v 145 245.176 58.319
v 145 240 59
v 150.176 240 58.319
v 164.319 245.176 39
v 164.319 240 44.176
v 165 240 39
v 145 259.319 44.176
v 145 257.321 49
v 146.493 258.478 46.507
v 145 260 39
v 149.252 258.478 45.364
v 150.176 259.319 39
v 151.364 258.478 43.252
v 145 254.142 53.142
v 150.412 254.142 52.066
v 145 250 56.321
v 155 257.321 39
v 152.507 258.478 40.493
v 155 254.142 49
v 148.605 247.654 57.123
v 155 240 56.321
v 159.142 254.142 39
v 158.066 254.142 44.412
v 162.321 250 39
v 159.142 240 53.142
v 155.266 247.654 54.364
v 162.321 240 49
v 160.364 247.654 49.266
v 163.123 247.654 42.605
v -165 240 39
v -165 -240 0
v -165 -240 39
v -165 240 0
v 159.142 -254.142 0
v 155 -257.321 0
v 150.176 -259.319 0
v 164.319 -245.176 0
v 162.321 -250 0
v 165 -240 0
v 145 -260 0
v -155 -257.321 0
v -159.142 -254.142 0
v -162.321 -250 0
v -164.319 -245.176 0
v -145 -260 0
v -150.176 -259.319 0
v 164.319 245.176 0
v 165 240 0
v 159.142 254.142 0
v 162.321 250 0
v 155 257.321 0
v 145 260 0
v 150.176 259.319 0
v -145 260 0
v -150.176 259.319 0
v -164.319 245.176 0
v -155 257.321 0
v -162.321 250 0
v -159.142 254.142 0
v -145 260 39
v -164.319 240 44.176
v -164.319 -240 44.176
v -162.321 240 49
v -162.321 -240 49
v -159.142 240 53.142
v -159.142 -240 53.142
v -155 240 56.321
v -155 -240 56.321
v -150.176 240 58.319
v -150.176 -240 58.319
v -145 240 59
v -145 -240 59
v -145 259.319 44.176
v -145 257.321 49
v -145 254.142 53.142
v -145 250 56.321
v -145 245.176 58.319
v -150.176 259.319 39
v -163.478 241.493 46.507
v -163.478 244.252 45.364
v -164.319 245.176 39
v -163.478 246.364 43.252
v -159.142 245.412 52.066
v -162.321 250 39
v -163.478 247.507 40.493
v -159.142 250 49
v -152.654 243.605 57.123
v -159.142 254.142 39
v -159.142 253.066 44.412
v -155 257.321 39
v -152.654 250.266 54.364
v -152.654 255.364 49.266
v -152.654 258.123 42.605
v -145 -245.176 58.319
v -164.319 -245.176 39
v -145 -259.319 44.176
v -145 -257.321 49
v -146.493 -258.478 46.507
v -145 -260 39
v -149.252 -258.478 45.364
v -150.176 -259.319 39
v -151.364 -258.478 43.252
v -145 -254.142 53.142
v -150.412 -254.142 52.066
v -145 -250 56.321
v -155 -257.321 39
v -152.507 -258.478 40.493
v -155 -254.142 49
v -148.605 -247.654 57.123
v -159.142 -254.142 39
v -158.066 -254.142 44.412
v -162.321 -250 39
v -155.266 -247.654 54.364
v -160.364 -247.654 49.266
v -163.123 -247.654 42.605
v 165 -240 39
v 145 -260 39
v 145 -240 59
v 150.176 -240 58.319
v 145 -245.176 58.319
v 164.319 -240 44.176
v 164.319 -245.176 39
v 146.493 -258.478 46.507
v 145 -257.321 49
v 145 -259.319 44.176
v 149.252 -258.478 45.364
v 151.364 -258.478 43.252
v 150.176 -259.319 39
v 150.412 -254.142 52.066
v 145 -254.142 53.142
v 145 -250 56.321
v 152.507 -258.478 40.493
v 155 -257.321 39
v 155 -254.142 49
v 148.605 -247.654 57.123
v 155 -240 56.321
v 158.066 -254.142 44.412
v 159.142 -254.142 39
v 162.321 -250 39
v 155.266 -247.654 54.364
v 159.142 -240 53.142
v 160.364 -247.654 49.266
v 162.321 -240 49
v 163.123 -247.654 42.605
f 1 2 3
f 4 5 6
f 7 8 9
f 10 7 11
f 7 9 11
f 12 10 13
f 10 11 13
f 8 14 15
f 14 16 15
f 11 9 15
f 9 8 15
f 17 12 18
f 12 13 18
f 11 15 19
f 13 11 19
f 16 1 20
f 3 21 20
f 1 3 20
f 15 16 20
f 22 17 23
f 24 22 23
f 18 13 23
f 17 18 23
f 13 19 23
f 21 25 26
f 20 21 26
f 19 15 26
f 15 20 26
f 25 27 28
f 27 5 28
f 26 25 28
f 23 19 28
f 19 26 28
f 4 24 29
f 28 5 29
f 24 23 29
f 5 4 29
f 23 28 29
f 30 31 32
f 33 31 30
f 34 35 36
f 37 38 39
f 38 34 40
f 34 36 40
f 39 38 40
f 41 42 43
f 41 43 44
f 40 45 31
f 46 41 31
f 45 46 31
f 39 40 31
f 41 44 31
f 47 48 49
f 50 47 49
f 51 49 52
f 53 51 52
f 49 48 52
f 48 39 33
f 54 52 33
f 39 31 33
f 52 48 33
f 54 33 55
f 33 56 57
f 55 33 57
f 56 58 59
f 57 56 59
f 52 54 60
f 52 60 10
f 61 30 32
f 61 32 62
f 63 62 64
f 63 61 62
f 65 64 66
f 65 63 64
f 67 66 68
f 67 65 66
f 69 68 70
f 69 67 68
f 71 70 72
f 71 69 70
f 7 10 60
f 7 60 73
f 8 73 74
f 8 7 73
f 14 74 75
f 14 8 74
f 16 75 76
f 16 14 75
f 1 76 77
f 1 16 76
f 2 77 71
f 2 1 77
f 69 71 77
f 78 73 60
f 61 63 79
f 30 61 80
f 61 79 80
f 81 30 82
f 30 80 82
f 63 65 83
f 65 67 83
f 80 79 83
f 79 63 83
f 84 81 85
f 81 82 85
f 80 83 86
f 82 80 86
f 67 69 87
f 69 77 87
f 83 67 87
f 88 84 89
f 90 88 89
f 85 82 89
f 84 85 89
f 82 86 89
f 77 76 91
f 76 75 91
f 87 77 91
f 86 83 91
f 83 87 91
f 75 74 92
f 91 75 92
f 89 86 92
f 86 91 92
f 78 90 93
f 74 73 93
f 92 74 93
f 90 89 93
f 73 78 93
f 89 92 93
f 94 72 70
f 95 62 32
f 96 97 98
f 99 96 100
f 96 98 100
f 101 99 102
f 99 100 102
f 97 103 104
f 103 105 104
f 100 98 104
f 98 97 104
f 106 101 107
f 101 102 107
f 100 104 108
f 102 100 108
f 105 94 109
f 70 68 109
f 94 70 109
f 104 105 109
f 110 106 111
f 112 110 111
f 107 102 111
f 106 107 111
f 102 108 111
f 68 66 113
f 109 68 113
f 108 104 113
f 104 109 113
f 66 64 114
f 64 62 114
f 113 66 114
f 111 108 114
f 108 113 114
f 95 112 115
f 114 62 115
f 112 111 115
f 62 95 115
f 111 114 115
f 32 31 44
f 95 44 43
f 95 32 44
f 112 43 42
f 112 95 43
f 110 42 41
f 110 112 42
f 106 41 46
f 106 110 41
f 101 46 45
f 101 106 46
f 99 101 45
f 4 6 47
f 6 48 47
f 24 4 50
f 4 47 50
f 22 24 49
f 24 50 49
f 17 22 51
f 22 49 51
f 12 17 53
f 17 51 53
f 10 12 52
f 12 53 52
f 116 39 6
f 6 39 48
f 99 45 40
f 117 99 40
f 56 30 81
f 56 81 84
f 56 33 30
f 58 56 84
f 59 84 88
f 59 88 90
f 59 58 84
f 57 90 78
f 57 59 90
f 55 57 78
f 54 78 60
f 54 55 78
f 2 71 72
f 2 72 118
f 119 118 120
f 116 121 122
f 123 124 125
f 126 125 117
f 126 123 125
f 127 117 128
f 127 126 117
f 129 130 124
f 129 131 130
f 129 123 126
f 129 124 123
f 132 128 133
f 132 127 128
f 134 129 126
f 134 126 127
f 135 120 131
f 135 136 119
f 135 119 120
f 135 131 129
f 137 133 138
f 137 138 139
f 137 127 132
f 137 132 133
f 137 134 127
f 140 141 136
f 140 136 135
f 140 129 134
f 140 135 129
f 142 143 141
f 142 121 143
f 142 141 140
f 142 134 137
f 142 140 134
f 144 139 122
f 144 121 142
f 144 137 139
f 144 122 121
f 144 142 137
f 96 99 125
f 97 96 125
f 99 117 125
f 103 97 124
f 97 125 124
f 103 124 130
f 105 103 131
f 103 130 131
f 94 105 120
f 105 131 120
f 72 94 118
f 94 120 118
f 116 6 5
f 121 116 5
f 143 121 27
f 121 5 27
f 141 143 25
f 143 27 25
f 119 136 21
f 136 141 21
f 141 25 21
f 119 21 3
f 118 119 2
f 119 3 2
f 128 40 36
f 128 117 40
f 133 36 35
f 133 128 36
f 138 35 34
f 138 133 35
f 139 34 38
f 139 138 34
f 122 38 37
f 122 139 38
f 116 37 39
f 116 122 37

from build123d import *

# Parameters (mm, degrees)
CROQUIS1_W              = 520
CROQUIS1_H              = 330
SALIENTE_EXTRUIR1_DEPTH = 9
CROQUIS2_W              = 330
CROQUIS2_H              = 520
SALIENTE_EXTRUIR2_DEPTH = 50
REDONDEO1_R             = 20


with BuildPart() as part:
    # Croquis1 → Saliente-Extruir1 (new body)
    with BuildSketch(Plane(origin=(0, 0, 0), x_dir=(0, 1, 0), z_dir=(0, 0, 1))):
        Rectangle(CROQUIS1_W, CROQUIS1_H)
    extrude(amount=SALIENTE_EXTRUIR1_DEPTH)

    # Croquis2 → Saliente-Extruir2 (add)
    with BuildSketch(Plane.XY.offset(9)):
        Rectangle(CROQUIS2_W, CROQUIS2_H)
    extrude(amount=SALIENTE_EXTRUIR2_DEPTH)

    # Redondeo1
    redondeo1_edges = [part.edges().sort_by_distance(p)[0] for p in [
        (165, 0, 59),
        (0, 260, 59),
        (-165, 0, 59),
        (0, -260, 59),
        (165, 260, 29.5),
        (165, -260, 29.5),
        (-165, -260, 29.5),
        (-165, 260, 29.5),
    ]]
    fillet(redondeo1_edges, radius=REDONDEO1_R)


solid = part.part
